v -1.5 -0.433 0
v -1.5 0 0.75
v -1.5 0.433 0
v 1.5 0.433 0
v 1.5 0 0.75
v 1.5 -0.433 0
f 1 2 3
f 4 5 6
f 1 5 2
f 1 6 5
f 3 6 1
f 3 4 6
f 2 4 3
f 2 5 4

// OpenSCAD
//Triangular Prism (Equilateral) for Stacks of Shapes
//by Slashee the Cow

color("Turquoise")
translate([-1.5,0,0.25])
rotate([180,0,0])
rotate([0,90,0])
linear_extrude(3, false)
circle(d  = 1, $fn = 3);
